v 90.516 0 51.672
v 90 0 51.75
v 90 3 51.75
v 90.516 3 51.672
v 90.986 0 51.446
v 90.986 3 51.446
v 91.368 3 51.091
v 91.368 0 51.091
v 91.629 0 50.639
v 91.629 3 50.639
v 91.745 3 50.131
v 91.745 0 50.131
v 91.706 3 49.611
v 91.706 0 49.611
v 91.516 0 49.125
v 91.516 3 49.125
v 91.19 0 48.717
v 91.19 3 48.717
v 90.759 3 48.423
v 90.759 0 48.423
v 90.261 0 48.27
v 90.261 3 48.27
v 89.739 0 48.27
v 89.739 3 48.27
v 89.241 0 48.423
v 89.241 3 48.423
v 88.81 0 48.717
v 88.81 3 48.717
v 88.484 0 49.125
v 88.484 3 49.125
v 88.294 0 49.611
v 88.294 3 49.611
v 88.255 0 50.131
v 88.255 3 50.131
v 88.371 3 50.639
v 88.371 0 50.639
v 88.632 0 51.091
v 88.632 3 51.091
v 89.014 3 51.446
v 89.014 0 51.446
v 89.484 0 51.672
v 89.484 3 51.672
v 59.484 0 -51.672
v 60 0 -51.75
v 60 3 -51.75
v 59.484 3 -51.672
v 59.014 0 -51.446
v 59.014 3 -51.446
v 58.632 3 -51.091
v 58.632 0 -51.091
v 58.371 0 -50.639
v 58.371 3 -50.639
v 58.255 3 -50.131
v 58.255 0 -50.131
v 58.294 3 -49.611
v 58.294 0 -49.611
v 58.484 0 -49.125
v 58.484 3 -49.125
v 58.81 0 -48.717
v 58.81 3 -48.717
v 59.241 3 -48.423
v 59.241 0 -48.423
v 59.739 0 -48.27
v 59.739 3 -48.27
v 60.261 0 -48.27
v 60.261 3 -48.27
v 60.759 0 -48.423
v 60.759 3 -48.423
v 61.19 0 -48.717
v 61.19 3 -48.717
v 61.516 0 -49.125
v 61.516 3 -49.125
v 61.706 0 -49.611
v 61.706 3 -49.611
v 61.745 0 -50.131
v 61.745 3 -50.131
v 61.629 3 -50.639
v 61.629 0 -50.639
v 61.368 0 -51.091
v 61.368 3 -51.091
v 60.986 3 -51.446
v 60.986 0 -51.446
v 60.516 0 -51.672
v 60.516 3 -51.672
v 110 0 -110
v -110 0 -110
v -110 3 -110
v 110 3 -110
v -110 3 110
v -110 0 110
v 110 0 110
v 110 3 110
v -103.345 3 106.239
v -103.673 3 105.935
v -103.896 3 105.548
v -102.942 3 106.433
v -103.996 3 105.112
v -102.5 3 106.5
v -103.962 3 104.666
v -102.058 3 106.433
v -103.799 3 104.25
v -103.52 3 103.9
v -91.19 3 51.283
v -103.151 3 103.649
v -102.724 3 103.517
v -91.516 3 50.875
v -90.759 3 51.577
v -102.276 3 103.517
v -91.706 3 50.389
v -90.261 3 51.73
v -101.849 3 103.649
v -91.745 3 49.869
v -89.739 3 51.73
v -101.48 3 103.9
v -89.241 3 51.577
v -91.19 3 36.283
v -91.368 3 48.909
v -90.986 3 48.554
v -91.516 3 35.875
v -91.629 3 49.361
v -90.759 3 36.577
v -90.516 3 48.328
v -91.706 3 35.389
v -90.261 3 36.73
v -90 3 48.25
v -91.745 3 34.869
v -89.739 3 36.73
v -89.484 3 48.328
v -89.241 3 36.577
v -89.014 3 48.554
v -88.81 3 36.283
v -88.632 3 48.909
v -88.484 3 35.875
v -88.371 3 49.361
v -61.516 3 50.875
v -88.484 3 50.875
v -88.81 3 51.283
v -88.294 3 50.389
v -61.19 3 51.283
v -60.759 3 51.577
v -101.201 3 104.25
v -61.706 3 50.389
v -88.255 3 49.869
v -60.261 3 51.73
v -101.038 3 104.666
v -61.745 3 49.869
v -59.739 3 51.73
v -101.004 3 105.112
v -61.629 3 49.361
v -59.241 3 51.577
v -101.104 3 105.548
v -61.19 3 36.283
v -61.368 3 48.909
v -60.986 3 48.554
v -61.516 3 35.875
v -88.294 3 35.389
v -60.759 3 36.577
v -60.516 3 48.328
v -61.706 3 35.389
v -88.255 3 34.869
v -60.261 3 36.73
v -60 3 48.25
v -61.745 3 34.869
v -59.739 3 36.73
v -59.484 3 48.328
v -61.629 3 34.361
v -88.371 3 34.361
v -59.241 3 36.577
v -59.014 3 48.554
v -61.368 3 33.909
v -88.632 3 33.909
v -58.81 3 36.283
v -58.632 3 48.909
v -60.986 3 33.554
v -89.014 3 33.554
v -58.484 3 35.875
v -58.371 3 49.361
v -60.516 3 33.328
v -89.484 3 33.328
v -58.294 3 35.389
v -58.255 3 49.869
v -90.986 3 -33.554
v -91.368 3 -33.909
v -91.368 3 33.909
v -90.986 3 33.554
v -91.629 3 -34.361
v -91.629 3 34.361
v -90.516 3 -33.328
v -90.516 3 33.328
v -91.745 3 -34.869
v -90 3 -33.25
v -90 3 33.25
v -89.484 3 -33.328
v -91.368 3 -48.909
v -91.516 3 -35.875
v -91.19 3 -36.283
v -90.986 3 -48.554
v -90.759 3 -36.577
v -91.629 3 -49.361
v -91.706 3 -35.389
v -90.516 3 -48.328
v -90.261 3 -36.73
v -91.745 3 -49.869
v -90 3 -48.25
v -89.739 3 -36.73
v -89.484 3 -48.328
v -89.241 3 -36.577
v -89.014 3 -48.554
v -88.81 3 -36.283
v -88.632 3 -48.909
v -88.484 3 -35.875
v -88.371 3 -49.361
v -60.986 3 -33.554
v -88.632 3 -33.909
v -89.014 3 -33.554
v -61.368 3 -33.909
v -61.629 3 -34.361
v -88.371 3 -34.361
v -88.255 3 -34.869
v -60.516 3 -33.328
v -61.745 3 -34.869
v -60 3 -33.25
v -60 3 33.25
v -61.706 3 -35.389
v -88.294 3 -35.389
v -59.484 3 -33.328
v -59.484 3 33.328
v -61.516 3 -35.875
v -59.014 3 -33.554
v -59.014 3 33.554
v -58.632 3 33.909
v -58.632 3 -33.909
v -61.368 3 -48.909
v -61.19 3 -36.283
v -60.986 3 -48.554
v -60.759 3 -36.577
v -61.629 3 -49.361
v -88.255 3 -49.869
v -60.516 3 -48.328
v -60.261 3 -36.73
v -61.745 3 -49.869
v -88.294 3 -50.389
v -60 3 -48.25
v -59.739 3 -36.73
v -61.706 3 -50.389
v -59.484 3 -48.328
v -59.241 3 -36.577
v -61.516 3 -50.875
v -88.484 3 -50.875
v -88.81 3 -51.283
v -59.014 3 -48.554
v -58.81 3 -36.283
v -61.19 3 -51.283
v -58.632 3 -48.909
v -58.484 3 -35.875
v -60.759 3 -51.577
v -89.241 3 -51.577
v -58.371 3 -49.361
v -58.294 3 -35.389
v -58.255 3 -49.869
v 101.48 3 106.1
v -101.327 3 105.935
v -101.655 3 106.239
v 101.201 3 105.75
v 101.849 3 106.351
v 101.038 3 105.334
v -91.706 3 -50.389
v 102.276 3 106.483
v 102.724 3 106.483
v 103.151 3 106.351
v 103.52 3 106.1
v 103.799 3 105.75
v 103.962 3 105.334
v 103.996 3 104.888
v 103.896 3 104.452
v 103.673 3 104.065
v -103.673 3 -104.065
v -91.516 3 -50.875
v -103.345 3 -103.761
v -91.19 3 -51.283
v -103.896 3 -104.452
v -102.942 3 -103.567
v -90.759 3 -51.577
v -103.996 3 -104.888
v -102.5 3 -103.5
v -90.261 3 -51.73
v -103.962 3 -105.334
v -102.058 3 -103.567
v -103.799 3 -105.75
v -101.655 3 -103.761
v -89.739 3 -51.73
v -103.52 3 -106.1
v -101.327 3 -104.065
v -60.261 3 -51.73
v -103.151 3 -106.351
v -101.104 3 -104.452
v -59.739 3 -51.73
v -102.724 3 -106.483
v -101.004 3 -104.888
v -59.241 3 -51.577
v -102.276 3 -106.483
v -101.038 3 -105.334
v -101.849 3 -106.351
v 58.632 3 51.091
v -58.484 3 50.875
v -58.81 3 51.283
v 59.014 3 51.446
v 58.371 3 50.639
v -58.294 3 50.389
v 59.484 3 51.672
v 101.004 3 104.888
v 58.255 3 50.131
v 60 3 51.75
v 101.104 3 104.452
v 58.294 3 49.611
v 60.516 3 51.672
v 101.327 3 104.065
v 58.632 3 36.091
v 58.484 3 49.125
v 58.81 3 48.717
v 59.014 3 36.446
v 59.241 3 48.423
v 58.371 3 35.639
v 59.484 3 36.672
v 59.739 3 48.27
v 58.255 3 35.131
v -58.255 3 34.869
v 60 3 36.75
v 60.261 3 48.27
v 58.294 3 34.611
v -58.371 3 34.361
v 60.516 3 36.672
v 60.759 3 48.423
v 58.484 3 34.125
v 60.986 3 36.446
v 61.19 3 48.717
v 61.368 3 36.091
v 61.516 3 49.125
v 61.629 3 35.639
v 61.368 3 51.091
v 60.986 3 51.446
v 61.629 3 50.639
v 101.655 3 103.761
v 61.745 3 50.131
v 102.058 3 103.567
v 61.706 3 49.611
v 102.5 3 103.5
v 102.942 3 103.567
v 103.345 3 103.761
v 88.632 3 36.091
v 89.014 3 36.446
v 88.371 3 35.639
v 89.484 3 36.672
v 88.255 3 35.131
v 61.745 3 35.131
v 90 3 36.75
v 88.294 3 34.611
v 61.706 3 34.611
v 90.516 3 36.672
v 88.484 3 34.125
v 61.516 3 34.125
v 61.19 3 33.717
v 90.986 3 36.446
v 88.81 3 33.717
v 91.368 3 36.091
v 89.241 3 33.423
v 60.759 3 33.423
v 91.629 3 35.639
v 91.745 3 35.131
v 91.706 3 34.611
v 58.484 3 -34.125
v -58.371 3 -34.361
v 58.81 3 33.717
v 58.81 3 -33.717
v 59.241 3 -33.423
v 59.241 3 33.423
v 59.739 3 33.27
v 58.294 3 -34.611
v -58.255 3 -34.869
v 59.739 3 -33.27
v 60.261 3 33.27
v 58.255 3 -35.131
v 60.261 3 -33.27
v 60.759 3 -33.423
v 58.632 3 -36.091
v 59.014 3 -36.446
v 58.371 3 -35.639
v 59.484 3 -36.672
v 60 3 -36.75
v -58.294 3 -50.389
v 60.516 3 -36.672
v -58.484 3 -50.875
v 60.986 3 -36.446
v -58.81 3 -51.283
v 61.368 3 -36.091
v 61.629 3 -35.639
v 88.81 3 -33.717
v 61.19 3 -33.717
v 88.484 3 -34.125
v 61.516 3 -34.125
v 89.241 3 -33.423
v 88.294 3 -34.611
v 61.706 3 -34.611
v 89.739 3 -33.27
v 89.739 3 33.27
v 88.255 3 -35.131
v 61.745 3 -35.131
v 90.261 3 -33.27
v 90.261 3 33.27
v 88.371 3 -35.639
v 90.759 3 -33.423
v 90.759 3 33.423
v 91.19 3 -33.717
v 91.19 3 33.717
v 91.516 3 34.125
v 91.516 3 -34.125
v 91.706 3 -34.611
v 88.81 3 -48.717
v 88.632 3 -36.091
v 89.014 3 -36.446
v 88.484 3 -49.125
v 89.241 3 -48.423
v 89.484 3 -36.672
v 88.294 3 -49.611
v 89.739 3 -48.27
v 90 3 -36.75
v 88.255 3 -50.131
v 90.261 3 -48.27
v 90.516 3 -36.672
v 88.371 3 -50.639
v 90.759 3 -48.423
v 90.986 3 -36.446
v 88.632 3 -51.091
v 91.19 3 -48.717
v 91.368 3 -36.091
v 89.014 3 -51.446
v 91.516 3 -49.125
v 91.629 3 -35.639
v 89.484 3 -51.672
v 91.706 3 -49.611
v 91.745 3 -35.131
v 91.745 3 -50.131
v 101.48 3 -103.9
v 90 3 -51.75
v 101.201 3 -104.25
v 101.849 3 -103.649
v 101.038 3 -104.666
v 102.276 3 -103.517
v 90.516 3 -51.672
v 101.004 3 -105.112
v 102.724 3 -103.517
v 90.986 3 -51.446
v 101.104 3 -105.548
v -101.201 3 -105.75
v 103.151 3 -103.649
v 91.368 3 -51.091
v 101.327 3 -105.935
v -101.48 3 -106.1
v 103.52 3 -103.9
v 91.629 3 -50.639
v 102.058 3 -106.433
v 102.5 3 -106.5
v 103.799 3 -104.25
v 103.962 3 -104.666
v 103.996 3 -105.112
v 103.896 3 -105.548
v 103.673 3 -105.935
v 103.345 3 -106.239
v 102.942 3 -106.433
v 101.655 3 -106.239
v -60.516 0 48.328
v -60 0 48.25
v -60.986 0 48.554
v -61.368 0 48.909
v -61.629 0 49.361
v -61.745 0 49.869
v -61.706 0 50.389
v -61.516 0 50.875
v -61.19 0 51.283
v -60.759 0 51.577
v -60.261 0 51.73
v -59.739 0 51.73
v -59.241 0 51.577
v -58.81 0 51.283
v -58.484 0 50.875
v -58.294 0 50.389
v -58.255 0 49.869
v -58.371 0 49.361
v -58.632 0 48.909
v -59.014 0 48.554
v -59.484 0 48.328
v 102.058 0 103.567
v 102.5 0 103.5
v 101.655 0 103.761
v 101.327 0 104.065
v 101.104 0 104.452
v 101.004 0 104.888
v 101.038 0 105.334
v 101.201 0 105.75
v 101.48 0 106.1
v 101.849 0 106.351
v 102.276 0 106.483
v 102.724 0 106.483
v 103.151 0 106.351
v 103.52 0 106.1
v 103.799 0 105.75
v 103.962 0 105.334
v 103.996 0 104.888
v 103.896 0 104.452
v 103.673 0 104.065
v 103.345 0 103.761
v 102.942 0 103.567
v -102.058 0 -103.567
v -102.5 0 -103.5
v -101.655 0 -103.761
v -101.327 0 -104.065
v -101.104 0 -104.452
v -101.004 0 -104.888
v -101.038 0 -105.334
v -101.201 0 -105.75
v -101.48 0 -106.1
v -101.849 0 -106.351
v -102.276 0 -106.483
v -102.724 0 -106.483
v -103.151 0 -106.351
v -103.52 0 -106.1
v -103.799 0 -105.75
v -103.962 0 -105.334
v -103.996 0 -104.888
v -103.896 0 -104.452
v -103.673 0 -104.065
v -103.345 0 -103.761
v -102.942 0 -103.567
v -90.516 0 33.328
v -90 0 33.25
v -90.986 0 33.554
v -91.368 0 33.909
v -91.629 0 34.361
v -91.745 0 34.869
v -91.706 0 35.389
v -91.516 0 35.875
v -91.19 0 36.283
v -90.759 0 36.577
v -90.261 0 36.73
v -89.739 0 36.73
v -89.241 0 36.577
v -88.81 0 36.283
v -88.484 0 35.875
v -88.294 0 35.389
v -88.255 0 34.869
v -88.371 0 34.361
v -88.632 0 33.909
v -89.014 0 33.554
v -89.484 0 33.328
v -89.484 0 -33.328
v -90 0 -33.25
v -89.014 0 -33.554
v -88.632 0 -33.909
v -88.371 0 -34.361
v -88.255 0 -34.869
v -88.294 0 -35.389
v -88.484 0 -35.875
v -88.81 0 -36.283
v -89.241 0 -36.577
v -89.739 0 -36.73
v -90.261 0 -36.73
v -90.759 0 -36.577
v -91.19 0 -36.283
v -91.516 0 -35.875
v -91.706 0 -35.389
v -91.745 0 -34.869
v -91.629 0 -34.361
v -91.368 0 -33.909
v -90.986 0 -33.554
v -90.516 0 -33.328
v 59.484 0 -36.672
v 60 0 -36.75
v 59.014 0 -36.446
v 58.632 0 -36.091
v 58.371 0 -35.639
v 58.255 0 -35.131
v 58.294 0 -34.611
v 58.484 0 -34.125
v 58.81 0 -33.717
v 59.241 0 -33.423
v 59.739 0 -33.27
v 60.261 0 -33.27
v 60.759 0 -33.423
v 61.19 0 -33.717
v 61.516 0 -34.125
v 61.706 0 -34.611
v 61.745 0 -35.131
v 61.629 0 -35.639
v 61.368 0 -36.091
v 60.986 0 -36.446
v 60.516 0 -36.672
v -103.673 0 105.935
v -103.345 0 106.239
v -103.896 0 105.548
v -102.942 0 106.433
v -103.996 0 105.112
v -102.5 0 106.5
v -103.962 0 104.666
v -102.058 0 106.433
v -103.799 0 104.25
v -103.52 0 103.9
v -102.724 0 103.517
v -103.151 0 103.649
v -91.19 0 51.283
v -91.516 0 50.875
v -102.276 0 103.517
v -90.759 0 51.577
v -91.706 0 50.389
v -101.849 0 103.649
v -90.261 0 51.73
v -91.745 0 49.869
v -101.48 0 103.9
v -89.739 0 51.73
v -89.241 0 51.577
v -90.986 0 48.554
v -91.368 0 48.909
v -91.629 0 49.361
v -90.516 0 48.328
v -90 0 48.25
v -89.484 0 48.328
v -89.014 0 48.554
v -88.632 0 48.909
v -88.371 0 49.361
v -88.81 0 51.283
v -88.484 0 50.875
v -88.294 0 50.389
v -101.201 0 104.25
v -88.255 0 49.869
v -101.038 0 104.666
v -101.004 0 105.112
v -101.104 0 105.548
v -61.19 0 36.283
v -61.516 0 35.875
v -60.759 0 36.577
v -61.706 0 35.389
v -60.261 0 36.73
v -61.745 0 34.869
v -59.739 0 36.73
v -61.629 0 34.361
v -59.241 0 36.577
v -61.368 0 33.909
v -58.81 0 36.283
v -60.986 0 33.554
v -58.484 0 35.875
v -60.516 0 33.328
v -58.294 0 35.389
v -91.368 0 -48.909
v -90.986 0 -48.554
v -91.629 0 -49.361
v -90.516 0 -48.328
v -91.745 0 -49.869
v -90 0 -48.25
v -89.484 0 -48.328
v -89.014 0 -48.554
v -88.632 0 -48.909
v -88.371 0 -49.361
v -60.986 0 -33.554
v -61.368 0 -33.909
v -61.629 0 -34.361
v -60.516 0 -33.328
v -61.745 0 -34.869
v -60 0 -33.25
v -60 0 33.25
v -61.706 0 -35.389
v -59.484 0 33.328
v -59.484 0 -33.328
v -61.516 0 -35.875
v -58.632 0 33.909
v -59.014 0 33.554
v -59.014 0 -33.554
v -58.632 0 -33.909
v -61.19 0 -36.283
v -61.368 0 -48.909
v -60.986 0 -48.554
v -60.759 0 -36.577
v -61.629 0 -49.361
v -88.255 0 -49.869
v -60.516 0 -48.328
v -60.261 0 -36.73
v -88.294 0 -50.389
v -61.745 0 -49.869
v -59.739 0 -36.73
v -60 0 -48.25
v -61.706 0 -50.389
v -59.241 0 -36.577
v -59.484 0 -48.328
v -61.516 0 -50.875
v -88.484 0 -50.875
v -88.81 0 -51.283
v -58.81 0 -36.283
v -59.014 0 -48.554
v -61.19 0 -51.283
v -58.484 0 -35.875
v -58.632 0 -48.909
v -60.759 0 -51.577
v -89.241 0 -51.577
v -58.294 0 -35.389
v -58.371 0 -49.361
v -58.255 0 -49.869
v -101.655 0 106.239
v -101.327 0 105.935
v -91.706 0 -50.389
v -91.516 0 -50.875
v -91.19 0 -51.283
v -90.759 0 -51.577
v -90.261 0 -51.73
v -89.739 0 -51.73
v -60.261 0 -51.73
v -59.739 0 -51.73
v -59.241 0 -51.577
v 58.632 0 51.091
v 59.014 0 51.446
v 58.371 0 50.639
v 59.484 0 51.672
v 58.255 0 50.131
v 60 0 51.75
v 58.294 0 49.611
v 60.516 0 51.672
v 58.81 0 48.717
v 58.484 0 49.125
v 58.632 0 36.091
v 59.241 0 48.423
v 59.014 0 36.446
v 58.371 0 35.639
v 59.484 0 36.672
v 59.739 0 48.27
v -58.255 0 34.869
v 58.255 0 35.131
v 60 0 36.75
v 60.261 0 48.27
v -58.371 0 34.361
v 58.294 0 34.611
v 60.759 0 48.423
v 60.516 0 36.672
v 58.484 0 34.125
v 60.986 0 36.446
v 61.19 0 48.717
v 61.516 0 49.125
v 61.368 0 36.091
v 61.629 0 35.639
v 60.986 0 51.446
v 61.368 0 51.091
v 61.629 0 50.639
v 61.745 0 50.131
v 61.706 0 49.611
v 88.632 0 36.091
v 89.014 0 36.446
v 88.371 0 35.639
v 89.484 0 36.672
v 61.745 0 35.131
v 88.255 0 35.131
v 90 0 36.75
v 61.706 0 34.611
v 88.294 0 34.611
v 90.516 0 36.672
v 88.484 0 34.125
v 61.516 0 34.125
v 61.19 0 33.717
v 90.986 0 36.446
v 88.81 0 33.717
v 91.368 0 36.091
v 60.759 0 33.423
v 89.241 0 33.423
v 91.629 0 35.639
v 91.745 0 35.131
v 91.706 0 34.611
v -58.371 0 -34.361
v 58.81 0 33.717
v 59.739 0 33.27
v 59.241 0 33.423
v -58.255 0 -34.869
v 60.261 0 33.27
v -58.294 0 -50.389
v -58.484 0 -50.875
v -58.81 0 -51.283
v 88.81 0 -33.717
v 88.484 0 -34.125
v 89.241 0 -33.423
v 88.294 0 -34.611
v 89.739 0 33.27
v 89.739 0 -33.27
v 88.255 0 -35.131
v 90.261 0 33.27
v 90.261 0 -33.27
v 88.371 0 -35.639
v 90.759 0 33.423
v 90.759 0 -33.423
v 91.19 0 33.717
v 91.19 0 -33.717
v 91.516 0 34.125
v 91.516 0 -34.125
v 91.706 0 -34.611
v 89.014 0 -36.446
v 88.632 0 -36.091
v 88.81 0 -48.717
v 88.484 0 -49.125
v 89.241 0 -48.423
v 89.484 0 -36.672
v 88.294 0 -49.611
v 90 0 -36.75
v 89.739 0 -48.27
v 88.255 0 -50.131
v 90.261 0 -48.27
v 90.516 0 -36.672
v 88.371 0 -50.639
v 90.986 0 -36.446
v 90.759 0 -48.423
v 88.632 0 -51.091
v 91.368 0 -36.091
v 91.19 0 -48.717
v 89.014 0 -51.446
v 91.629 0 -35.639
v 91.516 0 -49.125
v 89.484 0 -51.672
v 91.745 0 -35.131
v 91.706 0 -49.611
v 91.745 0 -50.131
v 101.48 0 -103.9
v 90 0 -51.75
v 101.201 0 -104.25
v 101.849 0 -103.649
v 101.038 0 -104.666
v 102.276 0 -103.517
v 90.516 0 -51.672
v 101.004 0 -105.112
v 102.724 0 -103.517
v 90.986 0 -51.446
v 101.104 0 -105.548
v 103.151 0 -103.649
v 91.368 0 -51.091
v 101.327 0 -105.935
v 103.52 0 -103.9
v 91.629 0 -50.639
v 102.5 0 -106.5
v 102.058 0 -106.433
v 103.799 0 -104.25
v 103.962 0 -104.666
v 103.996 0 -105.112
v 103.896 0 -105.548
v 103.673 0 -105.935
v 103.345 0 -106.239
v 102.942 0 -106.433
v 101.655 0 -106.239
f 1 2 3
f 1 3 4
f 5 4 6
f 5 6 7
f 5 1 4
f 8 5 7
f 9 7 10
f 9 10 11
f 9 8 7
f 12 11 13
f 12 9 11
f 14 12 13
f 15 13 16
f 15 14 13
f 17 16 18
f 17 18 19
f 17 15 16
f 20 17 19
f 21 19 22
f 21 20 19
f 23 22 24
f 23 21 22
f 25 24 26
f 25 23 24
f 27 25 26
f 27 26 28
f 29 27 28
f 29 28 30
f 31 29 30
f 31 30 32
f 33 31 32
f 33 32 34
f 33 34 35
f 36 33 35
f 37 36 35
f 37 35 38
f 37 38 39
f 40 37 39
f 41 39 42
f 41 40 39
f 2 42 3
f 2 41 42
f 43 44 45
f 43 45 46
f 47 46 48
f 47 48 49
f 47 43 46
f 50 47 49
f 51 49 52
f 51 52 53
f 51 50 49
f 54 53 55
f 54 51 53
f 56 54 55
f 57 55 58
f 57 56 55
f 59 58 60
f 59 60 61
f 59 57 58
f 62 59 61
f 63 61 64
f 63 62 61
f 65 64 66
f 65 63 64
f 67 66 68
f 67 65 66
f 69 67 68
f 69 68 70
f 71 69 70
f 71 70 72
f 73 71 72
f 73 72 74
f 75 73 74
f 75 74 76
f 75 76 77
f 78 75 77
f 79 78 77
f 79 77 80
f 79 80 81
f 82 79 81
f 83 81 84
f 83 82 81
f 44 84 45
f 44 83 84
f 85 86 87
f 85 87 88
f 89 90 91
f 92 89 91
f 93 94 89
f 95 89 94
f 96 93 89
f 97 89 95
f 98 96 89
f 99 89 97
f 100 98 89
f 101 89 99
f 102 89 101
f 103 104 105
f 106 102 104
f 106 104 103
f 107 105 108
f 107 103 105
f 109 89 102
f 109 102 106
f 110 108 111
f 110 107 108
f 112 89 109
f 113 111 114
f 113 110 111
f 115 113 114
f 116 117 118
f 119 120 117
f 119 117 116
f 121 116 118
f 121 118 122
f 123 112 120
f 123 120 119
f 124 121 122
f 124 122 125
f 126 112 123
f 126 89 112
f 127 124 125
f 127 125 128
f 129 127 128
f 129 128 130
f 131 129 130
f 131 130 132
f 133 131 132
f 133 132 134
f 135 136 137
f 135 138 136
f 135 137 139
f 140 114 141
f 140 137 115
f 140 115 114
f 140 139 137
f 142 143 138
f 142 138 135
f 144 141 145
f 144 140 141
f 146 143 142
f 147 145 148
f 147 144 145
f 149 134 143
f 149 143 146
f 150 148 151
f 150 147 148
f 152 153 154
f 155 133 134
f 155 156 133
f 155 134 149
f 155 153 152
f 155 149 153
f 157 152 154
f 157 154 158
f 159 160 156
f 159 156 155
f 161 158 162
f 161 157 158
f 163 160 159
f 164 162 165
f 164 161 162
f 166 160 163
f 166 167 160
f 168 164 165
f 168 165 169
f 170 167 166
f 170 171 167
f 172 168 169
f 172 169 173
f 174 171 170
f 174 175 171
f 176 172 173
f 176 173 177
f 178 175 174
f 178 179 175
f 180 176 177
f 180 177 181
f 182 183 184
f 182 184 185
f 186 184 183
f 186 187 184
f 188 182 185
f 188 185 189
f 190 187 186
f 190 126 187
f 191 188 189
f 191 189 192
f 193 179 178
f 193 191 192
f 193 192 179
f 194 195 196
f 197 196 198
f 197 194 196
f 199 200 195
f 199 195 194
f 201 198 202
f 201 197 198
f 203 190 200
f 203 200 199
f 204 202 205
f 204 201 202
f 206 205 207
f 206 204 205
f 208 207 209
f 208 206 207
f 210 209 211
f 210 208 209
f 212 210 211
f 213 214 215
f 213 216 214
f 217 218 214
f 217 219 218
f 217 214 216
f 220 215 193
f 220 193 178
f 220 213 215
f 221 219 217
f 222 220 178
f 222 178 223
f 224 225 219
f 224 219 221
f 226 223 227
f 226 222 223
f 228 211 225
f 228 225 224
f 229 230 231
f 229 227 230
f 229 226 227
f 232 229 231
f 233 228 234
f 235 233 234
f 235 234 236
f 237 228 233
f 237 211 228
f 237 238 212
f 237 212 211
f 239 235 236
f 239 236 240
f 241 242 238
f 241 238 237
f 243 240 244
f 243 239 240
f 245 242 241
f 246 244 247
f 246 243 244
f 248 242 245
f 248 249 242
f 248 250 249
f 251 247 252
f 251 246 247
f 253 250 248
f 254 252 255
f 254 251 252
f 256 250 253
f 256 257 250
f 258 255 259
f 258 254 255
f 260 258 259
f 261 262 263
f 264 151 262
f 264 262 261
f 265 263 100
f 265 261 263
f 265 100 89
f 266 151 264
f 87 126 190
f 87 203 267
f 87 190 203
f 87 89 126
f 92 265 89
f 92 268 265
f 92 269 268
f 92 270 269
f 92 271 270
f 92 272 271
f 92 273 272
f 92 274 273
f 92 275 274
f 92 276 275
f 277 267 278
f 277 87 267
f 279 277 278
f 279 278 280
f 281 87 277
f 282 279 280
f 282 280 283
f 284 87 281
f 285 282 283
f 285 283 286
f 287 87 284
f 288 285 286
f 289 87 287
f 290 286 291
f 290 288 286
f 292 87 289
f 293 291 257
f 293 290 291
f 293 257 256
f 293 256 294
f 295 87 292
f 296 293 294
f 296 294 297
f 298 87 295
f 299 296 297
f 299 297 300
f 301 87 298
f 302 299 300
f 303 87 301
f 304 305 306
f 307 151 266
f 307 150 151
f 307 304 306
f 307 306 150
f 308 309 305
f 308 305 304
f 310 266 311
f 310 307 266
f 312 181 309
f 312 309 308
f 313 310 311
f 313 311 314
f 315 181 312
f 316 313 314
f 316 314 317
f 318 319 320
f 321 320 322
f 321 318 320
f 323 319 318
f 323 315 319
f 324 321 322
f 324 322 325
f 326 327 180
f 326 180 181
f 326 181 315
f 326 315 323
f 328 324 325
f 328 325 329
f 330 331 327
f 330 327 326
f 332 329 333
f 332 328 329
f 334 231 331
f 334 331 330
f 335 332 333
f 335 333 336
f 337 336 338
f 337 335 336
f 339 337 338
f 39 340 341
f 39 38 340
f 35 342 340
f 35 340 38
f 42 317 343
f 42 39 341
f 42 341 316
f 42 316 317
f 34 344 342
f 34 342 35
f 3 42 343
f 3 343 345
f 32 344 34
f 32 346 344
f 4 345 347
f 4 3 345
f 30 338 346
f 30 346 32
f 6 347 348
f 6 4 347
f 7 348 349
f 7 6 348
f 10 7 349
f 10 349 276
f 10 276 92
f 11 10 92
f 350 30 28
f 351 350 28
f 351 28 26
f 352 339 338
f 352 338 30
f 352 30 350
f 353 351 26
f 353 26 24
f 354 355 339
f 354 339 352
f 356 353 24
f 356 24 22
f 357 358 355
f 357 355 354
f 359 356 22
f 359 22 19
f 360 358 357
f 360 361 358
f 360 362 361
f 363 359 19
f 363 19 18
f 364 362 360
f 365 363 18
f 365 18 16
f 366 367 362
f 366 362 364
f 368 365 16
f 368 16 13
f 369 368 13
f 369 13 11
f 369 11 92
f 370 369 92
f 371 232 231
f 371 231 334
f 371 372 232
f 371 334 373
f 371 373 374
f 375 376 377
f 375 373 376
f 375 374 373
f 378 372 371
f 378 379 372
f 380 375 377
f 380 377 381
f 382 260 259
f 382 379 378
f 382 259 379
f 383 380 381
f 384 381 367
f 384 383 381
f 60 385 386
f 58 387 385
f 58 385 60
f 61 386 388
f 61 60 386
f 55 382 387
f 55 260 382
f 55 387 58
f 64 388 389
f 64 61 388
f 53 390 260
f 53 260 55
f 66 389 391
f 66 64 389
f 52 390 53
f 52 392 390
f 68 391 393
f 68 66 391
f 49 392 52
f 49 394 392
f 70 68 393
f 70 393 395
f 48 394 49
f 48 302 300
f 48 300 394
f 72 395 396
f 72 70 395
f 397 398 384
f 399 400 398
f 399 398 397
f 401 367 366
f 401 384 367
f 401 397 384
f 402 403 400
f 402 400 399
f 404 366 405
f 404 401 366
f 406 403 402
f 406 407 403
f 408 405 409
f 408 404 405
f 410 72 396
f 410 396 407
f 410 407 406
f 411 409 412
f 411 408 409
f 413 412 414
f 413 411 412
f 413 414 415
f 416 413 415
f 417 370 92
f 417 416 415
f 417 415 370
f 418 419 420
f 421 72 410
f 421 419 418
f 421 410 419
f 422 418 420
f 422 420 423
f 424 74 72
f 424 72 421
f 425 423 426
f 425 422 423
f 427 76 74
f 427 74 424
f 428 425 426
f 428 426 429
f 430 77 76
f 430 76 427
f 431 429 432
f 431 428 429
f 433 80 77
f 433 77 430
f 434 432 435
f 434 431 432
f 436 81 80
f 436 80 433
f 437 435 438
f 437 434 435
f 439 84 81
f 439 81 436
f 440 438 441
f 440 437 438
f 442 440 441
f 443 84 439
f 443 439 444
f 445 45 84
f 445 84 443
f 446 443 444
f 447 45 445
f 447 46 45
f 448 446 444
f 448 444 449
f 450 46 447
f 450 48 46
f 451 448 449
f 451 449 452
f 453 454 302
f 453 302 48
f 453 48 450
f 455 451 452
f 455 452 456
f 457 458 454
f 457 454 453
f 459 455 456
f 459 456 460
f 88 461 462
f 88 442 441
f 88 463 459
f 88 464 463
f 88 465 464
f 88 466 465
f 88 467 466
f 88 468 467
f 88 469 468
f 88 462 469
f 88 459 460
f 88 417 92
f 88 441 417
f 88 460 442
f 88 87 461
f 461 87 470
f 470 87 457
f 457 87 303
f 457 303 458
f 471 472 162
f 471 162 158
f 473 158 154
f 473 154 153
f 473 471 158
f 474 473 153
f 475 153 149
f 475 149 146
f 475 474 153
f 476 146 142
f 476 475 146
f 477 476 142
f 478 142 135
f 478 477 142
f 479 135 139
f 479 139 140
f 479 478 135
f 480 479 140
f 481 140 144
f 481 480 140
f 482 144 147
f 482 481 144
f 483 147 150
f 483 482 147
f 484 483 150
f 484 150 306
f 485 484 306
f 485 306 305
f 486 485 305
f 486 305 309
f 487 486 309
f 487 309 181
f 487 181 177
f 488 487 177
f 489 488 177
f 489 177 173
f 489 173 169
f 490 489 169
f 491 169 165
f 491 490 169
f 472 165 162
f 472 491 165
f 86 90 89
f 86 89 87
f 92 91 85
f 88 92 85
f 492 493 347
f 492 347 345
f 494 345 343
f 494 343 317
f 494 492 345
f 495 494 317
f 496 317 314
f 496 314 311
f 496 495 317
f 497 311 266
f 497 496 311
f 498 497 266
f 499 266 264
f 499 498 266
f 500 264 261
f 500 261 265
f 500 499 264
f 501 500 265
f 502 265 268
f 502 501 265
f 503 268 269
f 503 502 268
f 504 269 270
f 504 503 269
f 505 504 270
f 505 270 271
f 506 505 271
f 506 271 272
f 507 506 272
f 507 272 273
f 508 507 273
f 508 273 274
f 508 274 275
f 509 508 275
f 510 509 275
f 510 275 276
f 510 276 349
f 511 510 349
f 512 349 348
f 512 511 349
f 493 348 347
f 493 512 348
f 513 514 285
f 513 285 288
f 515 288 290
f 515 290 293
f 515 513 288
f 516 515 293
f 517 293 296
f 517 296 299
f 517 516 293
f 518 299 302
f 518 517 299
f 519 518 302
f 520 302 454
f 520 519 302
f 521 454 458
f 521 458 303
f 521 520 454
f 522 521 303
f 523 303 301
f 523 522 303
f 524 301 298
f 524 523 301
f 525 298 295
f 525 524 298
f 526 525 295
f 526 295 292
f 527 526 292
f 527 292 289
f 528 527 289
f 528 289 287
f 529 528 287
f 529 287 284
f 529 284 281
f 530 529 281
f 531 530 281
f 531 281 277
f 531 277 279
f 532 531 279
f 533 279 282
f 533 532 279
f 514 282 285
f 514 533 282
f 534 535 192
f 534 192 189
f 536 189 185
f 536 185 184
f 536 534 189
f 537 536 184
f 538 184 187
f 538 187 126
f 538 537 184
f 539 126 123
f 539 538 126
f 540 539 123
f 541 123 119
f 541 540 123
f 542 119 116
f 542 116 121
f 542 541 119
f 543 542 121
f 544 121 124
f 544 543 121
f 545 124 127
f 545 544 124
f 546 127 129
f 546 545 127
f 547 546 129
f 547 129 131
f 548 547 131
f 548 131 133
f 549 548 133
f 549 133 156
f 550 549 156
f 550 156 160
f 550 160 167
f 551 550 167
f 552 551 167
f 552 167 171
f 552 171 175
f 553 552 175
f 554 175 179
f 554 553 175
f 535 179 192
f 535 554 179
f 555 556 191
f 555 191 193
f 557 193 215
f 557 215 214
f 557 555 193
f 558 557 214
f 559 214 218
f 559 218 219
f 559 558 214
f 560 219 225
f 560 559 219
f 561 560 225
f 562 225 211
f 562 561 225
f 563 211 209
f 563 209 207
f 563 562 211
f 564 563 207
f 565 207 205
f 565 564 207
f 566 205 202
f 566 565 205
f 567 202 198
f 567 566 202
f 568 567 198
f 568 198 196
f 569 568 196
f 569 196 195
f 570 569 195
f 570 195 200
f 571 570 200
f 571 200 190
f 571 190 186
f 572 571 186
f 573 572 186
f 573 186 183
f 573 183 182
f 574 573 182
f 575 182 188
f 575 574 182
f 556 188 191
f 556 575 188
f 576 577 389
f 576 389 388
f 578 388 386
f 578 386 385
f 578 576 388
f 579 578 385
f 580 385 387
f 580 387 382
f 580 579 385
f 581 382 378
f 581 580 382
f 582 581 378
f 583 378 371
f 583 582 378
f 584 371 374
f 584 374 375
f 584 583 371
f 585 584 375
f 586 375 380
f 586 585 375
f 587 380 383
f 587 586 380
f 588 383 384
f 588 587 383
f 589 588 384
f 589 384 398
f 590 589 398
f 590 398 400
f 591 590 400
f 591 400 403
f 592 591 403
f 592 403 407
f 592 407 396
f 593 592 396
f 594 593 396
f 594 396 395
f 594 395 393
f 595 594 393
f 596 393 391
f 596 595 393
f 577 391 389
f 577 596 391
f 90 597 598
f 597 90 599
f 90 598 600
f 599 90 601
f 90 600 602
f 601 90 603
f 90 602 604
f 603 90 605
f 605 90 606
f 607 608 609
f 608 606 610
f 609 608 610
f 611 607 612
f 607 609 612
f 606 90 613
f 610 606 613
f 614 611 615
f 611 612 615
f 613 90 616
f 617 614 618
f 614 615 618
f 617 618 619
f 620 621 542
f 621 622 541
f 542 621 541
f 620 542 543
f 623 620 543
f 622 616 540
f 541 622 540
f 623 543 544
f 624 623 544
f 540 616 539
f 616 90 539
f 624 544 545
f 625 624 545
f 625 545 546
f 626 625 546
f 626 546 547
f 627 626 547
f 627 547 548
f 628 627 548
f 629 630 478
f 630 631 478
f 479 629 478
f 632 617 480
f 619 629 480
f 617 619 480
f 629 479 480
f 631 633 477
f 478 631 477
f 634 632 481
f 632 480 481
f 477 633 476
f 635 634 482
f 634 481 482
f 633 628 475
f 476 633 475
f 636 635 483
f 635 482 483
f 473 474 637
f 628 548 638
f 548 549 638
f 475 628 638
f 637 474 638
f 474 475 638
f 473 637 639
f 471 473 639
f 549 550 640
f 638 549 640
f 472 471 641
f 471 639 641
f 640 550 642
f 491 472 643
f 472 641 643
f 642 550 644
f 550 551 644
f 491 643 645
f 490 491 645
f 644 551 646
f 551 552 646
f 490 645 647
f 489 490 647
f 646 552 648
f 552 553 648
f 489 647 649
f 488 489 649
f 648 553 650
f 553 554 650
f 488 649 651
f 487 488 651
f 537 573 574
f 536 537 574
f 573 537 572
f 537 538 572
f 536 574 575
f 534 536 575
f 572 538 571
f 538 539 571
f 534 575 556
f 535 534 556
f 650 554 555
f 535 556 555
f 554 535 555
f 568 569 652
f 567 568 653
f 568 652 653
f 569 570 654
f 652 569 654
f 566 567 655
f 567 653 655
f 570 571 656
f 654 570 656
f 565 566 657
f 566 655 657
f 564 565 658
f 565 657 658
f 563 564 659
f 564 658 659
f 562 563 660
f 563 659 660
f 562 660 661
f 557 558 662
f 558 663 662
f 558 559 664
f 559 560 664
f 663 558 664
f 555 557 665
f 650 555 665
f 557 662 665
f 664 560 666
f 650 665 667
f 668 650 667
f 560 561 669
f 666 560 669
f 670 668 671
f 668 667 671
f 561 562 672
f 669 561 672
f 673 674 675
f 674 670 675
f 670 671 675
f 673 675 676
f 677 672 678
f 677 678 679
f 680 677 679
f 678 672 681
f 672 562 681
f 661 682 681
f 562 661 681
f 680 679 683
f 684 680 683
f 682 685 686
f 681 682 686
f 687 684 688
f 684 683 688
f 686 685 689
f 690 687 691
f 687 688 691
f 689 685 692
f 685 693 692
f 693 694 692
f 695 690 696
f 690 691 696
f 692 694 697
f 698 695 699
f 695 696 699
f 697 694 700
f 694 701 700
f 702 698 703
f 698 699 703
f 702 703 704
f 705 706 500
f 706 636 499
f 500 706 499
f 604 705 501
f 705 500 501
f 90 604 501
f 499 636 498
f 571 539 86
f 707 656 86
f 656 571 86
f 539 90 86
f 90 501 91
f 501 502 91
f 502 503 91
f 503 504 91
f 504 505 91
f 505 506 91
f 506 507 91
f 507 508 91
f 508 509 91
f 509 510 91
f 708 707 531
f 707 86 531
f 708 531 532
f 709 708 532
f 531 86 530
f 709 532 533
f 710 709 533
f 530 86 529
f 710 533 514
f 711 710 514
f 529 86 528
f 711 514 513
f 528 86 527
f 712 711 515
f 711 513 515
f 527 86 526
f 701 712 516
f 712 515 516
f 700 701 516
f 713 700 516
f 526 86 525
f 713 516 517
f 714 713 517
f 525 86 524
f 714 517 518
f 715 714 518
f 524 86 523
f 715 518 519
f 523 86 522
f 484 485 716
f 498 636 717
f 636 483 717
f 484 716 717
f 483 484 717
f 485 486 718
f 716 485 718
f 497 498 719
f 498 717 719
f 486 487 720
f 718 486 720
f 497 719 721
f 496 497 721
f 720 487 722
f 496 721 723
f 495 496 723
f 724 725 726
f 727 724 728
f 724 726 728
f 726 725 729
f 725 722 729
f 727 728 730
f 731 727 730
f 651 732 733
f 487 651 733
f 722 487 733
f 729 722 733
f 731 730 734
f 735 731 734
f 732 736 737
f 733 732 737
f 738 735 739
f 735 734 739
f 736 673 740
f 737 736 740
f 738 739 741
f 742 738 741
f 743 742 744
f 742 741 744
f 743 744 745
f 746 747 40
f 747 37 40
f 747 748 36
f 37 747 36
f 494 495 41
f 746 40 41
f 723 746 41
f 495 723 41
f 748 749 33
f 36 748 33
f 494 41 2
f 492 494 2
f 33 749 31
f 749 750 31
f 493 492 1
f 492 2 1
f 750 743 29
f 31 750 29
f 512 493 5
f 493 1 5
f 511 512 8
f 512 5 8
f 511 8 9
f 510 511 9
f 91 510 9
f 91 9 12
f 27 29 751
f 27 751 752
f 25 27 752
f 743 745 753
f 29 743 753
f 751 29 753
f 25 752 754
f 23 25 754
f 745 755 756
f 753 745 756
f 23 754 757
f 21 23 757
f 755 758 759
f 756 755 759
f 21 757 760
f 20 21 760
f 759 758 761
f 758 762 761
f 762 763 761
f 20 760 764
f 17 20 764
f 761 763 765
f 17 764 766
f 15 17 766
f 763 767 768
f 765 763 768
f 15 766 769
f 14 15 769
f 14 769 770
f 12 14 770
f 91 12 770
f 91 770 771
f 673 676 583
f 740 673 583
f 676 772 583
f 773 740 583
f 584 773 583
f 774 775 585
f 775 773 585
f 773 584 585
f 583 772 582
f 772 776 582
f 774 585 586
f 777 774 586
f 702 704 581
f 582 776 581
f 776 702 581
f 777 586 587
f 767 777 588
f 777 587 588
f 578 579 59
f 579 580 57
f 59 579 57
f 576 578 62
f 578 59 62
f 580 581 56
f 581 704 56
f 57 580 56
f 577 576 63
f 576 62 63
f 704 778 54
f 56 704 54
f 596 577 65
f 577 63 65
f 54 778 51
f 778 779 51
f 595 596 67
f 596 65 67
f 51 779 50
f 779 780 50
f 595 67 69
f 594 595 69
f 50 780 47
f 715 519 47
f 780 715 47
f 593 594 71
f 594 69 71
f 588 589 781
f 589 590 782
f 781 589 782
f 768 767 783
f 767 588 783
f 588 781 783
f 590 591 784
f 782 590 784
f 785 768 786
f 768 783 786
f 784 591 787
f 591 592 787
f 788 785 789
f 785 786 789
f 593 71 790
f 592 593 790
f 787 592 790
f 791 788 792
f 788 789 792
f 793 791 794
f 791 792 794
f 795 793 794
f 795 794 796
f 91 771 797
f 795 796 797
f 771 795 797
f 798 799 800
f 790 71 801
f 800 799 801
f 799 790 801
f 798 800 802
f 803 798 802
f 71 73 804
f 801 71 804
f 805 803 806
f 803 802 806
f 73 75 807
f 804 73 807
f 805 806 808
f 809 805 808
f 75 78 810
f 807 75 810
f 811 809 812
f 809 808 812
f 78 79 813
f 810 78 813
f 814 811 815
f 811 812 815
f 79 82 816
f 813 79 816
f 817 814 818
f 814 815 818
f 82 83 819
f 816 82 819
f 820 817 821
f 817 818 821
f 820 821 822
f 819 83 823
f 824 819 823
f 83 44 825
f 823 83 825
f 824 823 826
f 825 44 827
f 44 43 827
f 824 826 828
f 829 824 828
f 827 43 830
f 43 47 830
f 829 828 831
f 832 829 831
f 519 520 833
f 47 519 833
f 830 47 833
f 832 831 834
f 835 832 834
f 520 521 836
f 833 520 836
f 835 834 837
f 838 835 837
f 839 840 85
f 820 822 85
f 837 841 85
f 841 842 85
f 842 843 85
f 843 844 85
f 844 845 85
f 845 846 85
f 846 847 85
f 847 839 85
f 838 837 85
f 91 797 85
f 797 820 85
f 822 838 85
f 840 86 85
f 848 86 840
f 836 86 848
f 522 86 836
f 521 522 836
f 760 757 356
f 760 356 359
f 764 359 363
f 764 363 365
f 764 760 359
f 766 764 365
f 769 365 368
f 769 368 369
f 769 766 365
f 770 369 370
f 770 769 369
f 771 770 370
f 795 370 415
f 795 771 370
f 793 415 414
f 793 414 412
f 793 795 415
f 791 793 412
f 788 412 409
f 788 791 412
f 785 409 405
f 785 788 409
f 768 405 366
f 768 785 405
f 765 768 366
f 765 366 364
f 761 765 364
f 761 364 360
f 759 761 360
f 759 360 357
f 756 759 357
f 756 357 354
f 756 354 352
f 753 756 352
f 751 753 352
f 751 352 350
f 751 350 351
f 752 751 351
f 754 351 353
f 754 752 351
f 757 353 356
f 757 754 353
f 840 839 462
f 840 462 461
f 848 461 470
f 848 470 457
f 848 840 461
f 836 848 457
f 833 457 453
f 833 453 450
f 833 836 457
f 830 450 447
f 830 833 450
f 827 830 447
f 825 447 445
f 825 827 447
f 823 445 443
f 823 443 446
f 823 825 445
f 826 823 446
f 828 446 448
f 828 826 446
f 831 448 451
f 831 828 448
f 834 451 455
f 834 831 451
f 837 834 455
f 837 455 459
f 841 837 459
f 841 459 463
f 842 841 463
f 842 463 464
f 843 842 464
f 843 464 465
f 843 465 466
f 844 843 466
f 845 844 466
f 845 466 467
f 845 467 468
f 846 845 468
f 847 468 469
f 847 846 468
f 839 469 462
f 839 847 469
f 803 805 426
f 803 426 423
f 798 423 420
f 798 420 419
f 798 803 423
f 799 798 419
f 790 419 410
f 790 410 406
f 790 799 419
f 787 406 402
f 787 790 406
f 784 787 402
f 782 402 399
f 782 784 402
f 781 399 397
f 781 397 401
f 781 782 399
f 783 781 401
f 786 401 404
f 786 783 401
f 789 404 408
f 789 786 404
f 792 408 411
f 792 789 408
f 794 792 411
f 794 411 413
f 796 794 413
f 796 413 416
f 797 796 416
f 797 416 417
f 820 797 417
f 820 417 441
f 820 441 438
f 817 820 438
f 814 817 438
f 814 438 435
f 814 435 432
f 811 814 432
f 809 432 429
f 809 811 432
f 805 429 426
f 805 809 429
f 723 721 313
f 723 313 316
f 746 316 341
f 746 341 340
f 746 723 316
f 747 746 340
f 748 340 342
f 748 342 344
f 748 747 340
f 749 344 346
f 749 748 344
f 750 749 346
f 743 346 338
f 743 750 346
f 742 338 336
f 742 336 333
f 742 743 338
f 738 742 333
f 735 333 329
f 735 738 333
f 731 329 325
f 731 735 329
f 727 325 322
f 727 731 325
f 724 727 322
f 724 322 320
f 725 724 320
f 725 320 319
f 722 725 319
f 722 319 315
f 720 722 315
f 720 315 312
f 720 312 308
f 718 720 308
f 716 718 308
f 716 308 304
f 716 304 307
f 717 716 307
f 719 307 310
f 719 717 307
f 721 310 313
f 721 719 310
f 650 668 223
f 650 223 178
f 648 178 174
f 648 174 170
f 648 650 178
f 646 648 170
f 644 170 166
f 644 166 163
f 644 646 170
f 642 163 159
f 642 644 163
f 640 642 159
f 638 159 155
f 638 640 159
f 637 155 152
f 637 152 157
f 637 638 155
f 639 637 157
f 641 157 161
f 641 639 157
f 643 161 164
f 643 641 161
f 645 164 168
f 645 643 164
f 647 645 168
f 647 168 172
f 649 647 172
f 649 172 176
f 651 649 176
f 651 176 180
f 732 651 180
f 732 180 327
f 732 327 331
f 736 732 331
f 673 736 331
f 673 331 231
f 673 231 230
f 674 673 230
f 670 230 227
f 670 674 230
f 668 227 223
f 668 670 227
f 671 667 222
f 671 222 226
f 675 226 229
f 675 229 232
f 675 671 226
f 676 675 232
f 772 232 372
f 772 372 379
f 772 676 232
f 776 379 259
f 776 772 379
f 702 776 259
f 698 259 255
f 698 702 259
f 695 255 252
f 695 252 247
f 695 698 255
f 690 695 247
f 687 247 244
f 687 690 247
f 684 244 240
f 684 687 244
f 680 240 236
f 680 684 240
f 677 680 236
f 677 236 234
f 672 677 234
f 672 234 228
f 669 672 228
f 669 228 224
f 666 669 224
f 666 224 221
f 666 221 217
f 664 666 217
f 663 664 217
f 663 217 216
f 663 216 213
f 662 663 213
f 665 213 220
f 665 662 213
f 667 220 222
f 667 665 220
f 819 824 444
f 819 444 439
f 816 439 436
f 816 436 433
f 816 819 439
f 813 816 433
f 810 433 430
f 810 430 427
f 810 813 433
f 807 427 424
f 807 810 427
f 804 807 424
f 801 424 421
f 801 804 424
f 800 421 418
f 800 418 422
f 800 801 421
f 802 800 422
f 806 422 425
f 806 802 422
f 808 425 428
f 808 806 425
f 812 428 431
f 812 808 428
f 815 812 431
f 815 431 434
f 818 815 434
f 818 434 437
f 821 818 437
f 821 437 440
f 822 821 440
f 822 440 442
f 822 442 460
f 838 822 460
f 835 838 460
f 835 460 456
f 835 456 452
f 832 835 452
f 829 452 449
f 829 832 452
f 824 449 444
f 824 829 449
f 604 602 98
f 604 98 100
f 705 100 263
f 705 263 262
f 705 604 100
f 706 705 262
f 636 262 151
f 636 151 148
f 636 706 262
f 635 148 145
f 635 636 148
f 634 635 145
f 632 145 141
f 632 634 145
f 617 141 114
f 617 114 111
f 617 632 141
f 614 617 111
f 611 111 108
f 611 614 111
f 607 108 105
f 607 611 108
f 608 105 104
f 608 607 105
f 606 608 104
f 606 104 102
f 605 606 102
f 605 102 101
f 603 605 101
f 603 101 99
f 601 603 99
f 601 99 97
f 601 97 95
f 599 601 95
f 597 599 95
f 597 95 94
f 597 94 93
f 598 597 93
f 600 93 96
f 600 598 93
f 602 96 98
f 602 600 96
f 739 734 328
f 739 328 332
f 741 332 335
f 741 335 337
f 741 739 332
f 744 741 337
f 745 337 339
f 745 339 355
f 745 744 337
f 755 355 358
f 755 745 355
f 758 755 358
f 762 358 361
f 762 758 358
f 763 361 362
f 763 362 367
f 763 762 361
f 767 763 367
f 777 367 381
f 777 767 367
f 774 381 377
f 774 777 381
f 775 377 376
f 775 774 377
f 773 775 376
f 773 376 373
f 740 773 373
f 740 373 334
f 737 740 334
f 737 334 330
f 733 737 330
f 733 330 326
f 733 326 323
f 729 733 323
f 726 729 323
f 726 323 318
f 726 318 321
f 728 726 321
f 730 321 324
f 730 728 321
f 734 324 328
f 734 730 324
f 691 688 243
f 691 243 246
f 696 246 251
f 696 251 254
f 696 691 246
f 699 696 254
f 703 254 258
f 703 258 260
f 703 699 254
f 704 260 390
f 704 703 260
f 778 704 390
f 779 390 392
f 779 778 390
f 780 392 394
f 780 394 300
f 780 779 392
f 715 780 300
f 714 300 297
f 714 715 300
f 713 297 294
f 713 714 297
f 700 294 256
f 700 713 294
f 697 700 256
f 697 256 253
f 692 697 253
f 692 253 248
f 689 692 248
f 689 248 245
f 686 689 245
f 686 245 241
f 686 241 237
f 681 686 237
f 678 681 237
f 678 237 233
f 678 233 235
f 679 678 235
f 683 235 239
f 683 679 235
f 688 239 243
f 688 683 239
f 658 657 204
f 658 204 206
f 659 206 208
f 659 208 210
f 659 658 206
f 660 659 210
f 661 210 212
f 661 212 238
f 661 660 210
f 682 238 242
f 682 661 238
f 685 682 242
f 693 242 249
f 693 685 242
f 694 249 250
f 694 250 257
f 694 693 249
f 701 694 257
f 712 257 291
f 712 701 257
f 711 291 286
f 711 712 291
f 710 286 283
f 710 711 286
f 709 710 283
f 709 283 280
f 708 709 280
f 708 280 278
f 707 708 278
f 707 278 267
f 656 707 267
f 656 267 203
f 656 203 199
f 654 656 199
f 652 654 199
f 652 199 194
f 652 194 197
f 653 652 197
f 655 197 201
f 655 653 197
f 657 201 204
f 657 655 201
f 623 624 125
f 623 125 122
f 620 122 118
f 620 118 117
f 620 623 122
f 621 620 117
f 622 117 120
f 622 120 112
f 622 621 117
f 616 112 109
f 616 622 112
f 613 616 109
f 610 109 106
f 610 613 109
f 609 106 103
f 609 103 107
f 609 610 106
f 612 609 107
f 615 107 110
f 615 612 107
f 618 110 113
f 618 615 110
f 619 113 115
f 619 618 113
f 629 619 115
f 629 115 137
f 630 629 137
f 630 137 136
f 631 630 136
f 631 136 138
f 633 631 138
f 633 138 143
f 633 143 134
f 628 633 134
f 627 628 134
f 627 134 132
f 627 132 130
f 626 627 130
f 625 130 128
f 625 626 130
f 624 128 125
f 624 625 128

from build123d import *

# Parameters (mm, degrees)
ESBO_O1_W                = 220
ESBO_O1_H                = 220
ESBO_O1_R                = 1.5
ESBO_O1_R_2              = 1.75
RESSALTO_EXTRUS_O1_DEPTH = 3


with BuildPart() as part:
    # Esboço1 → Ressalto-extrusão1 (new body)
    with BuildSketch(Plane(origin=(0, 0, 0), x_dir=(1, 0, 0), z_dir=(0, 1, 0))):
        Rectangle(ESBO_O1_W, ESBO_O1_H)
        with Locations(Location((-102.5, 105, 0), (0, 0, 270))):
            Circle(ESBO_O1_R, mode=Mode.SUBTRACT)
        with Locations(Location((-102.5, -105, 0), (0, 0, 270))):
            Circle(ESBO_O1_R, mode=Mode.SUBTRACT)
        with Locations(Location((102.5, -105, 0), (0, 0, 90))):
            Circle(ESBO_O1_R, mode=Mode.SUBTRACT)
        with Locations(Location((102.5, 105, 0), (0, 0, 90))):
            Circle(ESBO_O1_R, mode=Mode.SUBTRACT)
        with Locations(Location((-90, 50, 0), (0, 0, 270))):
            Circle(ESBO_O1_R_2, mode=Mode.SUBTRACT)
        with Locations(Location((-60, 35, 0), (0, 0, 270))):
            Circle(ESBO_O1_R_2, mode=Mode.SUBTRACT)
        with Locations(Location((-90, 35, 0), (0, 0, 270))):
            Circle(ESBO_O1_R_2, mode=Mode.SUBTRACT)
        with Locations(Location((-60, 50, 0), (0, 0, 270))):
            Circle(ESBO_O1_R_2, mode=Mode.SUBTRACT)
        with Locations(Location((60, 50, 0), (0, 0, 90))):
            Circle(ESBO_O1_R_2, mode=Mode.SUBTRACT)
        with Locations(Location((90, 35, 0), (0, 0, 90))):
            Circle(ESBO_O1_R_2, mode=Mode.SUBTRACT)
        with Locations(Location((60, 35, 0), (0, 0, 90))):
            Circle(ESBO_O1_R_2, mode=Mode.SUBTRACT)
        with Locations(Location((90, 50, 0), (0, 0, 90))):
            Circle(ESBO_O1_R_2, mode=Mode.SUBTRACT)
        with Locations(Location((90, -50, 0), (0, 0, 270))):
            Circle(ESBO_O1_R_2, mode=Mode.SUBTRACT)
        with Locations(Location((60, -35, 0), (0, 0, 270))):
            Circle(ESBO_O1_R_2, mode=Mode.SUBTRACT)
        with Locations(Location((90, -35, 0), (0, 0, 270))):
            Circle(ESBO_O1_R_2, mode=Mode.SUBTRACT)
        with Locations(Location((60, -50, 0), (0, 0, 270))):
            Circle(ESBO_O1_R_2, mode=Mode.SUBTRACT)
        with Locations(Location((-60, -50, 0), (0, 0, 90))):
            Circle(ESBO_O1_R_2, mode=Mode.SUBTRACT)
        with Locations(Location((-90, -35, 0), (0, 0, 90))):
            Circle(ESBO_O1_R_2, mode=Mode.SUBTRACT)
        with Locations(Location((-60, -35, 0), (0, 0, 90))):
            Circle(ESBO_O1_R_2, mode=Mode.SUBTRACT)
        with Locations(Location((-90, -50, 0), (0, 0, 90))):
            Circle(ESBO_O1_R_2, mode=Mode.SUBTRACT)
    extrude(amount=RESSALTO_EXTRUS_O1_DEPTH)


solid = part.part
